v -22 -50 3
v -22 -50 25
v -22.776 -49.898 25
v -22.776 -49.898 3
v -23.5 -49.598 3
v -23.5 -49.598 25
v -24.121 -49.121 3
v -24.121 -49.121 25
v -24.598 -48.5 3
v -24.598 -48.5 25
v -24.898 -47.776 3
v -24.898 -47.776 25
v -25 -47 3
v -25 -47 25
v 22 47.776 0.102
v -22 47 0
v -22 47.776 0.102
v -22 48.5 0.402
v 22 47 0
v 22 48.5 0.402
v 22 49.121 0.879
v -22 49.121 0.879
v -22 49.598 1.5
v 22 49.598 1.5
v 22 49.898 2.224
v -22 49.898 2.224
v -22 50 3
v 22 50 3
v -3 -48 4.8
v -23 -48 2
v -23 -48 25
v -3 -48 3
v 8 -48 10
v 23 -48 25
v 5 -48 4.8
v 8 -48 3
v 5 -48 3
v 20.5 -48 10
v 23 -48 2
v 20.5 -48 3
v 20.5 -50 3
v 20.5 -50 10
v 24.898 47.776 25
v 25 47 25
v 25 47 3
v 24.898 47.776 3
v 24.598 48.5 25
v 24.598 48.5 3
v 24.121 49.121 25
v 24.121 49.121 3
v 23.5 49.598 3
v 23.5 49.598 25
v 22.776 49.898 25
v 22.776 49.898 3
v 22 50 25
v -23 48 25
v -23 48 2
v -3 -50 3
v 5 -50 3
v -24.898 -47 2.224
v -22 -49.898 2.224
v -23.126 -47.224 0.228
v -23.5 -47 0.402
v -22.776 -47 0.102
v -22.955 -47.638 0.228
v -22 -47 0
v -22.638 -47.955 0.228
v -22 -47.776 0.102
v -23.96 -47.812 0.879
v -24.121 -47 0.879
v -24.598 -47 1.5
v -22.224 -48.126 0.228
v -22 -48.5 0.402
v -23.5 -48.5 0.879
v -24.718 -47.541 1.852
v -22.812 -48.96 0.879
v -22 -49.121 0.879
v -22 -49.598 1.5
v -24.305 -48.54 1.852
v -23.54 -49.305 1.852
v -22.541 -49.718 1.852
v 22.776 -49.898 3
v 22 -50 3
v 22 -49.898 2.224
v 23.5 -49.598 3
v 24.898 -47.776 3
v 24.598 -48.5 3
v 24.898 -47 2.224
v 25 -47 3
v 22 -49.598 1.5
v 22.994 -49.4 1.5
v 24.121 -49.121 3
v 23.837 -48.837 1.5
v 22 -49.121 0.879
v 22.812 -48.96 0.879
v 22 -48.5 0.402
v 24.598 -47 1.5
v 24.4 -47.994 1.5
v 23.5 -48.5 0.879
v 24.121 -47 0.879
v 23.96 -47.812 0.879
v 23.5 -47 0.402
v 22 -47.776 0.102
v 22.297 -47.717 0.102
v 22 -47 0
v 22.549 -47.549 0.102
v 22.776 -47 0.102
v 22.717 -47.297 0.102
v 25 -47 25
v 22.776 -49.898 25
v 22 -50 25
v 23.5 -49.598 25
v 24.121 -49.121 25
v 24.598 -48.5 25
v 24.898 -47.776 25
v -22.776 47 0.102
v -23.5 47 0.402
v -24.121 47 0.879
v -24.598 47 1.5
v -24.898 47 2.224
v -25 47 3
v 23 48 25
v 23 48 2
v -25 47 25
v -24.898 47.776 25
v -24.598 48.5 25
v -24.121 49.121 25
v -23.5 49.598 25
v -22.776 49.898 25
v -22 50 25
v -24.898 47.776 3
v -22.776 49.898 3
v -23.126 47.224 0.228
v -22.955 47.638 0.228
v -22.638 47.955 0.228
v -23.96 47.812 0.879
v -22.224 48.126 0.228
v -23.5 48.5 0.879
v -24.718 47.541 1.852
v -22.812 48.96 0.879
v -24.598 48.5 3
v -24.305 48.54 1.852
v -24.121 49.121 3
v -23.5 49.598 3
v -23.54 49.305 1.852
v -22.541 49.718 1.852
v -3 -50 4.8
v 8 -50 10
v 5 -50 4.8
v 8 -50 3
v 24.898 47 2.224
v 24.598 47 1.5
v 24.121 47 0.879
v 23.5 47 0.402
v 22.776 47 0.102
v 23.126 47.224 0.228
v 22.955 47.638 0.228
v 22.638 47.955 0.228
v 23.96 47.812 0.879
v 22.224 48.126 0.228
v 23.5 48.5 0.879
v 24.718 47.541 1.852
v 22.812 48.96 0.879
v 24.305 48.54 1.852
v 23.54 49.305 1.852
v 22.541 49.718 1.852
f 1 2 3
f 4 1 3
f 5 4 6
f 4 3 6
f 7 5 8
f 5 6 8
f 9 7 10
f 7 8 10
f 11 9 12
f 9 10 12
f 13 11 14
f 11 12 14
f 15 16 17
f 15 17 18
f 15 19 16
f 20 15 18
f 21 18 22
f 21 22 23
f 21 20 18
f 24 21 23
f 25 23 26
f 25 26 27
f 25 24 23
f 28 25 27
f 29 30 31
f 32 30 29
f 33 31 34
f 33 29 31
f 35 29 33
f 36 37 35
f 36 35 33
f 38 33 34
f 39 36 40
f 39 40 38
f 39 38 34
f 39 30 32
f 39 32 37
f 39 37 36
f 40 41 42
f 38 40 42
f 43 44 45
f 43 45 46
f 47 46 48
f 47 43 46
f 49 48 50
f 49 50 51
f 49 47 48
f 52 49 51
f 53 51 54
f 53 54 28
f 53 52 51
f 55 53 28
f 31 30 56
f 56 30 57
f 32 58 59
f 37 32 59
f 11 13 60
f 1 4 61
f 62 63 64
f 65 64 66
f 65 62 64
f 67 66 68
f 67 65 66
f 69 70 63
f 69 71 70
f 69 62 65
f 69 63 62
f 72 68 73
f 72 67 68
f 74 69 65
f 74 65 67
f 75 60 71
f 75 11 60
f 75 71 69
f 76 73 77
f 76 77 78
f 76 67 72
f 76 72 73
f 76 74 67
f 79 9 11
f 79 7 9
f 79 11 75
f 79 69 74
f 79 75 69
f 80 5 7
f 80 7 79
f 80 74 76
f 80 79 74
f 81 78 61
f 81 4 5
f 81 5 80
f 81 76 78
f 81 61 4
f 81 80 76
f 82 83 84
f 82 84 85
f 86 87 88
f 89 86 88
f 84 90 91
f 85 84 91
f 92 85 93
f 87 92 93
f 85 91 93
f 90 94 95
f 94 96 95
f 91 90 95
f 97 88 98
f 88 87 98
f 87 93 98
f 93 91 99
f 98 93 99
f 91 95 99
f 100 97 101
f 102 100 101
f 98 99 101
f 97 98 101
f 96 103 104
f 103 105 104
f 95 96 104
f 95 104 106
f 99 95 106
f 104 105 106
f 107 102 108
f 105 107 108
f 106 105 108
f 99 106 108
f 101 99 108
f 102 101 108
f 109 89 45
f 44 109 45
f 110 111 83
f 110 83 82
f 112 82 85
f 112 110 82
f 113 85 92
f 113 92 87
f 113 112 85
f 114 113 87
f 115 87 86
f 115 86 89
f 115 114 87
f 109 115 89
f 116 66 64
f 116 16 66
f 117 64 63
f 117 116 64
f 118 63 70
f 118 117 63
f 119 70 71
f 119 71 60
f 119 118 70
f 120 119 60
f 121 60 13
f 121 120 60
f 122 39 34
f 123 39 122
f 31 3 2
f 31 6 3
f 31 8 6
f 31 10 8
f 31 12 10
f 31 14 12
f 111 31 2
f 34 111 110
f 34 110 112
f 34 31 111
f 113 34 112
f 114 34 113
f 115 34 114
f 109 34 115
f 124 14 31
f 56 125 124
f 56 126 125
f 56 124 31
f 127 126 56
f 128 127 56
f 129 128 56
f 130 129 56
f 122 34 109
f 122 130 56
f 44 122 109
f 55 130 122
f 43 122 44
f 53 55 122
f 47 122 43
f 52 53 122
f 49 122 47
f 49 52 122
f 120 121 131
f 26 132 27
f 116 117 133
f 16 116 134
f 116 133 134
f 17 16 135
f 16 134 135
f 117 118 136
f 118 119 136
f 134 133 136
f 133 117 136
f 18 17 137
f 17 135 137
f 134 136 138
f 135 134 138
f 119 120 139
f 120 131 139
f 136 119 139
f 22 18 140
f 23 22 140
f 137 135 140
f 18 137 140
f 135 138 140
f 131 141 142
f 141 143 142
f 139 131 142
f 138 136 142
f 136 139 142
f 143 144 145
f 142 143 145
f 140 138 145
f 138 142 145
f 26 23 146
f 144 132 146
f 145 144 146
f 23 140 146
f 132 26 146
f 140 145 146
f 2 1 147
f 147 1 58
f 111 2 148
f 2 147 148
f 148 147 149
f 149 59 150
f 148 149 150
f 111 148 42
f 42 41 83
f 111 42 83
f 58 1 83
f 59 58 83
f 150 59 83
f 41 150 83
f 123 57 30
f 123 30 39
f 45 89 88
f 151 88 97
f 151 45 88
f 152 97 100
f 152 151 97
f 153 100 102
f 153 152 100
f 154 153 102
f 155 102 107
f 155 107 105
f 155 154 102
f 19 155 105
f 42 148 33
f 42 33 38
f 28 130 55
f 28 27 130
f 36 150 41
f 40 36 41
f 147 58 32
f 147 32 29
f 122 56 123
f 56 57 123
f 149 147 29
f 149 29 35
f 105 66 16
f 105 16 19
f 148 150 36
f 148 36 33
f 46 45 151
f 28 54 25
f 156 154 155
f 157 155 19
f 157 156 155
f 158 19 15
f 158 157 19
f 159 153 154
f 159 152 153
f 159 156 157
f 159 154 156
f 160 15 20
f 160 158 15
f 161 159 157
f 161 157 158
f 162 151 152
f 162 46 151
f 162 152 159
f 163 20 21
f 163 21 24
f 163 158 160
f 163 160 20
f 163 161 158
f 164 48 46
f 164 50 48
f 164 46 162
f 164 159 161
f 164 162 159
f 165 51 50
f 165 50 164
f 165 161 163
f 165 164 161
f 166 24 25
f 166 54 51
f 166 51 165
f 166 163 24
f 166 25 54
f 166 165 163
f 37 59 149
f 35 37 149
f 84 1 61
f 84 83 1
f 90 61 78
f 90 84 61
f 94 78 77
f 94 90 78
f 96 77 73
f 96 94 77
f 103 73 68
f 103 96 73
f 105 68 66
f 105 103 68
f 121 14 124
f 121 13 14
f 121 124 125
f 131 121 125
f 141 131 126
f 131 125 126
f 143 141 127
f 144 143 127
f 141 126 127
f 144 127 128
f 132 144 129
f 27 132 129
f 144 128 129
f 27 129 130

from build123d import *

# Parameters (mm, degrees)
F0_W     = 50
F0_H     = 100
F1_DEPTH = 25
F2_T     = -2
F3_W     = 12.5
F3_H     = 7
F3_W_2   = 8
F3_H_2   = 1.8
F4_DEPTH = 2
F5_R     = 3
F6_R     = 2.99999


# Not quite as in the source:
# - a fillet or chamfer is up to 0.001 mm smaller than in the source, because OpenCascade refuses the exact size


with BuildPart() as f1:
    # F0 (on Top) → F1 (new body)
    with BuildSketch(Plane.XY):
        Rectangle(F0_W, F0_H)
    extrude(amount=F1_DEPTH)

    # F2
    f2_openings = [f1.faces().sort_by_distance(p)[0] for p in [
        (0, 0, 25),
    ]]
    offset(amount=F2_T, openings=f2_openings)

    # F3 (on face) → F4 (cut)
    with BuildSketch(Plane.XZ.offset(50)):
        with Locations((14.25, 6.5)):
            Rectangle(F3_W, F3_H)
        with Locations((1, 3.9)):
            Rectangle(F3_W_2, F3_H_2)
    extrude(amount=-F4_DEPTH, mode=Mode.SUBTRACT)

    # F5
    f5_edges = [f1.edges().sort_by_distance(p)[0] for p in [
        (25, -50, 12.5),
    ]]
    fillet(f5_edges, radius=F5_R)

    # F6 (radius 3 in the source; OpenCascade refuses exactly that, so slightly less here)
    f6_edges = [f1.edges().sort_by_distance(p)[0] for p in [
        (25, 50, 12.5),
        (-25, 50, 12.5),
        (-25, -50, 12.5),
        (-25, 0, 0),
        (-1.5, -50, 0),
        (0, 50, 0),
    ]]
    fillet(f6_edges, radius=F6_R)


solid = f1.part
